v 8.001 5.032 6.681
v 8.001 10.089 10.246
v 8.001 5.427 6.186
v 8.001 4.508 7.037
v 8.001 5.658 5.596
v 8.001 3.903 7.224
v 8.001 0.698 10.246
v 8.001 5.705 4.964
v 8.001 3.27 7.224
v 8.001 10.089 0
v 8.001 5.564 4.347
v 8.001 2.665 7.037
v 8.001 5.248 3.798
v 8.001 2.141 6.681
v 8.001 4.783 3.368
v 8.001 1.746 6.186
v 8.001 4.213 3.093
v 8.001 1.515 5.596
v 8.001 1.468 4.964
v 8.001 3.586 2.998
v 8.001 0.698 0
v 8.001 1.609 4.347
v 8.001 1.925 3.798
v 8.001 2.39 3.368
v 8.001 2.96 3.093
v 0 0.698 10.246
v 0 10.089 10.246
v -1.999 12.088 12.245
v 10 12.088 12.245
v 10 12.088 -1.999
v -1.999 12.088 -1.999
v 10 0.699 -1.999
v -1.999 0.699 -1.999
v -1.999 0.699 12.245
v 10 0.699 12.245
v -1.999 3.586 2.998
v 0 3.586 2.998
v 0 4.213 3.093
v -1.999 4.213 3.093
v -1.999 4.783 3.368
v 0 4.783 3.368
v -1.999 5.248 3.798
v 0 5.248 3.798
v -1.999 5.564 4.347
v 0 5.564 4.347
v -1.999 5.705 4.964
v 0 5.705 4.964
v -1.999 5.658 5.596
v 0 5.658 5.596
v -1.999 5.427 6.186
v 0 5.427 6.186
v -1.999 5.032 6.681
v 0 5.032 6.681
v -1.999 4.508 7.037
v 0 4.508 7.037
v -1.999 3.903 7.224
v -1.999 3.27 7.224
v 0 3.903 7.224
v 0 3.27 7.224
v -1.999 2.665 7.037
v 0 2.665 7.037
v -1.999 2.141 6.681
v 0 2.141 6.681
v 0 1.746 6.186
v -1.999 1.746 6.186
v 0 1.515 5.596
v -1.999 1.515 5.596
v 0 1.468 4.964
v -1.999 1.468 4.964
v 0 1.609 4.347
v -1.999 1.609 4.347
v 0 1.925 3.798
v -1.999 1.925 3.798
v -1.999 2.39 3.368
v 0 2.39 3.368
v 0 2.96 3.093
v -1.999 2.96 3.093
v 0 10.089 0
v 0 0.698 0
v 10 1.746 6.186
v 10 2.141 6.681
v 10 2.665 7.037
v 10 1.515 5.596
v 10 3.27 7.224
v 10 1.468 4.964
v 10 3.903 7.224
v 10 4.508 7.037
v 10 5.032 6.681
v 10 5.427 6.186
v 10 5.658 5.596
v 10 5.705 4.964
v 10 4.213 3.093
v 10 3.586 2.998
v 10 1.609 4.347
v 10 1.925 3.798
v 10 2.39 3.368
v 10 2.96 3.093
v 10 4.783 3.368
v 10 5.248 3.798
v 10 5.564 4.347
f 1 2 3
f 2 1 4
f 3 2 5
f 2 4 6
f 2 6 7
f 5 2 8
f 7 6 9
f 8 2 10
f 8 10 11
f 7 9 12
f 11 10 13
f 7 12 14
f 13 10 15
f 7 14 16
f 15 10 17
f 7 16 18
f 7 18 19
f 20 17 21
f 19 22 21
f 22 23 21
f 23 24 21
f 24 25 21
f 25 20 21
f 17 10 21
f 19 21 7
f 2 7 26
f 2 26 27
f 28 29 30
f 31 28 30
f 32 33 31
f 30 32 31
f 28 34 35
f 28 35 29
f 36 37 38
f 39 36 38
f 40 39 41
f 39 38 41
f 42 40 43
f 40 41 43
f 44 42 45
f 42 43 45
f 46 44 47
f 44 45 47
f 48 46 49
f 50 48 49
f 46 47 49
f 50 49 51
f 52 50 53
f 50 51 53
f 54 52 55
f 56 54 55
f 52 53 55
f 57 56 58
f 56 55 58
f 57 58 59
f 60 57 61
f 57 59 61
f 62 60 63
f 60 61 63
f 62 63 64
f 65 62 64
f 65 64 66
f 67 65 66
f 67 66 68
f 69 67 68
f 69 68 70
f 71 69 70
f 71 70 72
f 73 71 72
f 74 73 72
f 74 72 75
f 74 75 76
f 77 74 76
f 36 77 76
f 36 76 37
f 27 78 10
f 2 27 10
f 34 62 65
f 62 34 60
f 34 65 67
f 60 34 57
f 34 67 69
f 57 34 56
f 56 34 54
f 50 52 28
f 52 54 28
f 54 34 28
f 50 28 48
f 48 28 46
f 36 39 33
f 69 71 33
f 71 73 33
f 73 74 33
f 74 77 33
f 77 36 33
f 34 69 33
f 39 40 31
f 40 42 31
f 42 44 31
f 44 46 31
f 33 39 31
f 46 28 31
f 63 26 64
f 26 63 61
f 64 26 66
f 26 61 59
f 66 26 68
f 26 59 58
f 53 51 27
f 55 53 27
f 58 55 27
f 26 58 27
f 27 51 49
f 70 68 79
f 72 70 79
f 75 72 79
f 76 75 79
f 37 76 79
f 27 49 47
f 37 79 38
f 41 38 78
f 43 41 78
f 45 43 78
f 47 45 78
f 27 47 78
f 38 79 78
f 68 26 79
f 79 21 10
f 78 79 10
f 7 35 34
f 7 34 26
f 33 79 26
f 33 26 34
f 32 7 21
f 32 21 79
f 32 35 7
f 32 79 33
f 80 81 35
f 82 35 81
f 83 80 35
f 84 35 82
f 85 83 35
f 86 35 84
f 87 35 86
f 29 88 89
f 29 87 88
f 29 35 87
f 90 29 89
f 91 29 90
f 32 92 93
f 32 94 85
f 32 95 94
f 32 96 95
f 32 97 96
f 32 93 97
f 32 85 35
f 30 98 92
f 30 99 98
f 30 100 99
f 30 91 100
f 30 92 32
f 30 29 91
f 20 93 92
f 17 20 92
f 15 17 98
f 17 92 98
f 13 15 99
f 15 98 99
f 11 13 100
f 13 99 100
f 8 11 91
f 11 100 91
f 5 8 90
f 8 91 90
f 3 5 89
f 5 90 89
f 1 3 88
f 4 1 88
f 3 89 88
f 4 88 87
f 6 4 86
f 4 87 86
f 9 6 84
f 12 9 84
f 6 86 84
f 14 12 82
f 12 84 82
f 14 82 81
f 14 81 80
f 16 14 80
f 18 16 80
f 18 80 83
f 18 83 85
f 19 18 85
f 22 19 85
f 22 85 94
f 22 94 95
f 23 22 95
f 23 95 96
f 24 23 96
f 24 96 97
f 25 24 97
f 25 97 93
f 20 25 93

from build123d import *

# Parameters (mm, degrees)
BOSS_EXTRUDE1_DEPTH = 10.24636
SKETCH2_R           = 2.12471
CUT_EXTRUDE1_DEPTH  = 12.99896
SKETCH3_W           = 10.24636
SKETCH3_H           = 0.6985
CUT_EXTRUDE2_DEPTH  = 12.99896
SKETCH4_W           = 1.99898
SKETCH4_H           = 11.38936
BOSS_EXTRUDE2_DEPTH = 11.99896


with BuildPart() as part:
    # Sketch1 → Boss-Extrude1 (new body)
    with BuildSketch(Plane.XY):
        Polygon((0, 0), (0, 10.08888), (8.001, 10.08888), (8.001, 0), (9.99998, 0), (9.99998, 12.08786), (-1.99898, 12.08786), (-1.99898, 0), align=None)
    extrude(amount=BOSS_EXTRUDE1_DEPTH)

    # Sketch2 → Cut-Extrude1 (cut, through all)
    with BuildSketch(Plane(origin=(9.99998, 0, 0), x_dir=(0, 0, -1), z_dir=(1, 0, 0))):
        with Locations((-5.12318, 3.58648)):
            Circle(SKETCH2_R)
    extrude(amount=-CUT_EXTRUDE1_DEPTH, mode=Mode.SUBTRACT)

    # Sketch3 → Cut-Extrude2 (cut, through all)
    with BuildSketch(Plane(origin=(9.99998, 0, 0), x_dir=(0, 0, -1), z_dir=(1, 0, 0))):
        with Locations((-5.12318, 0.34925)):
            Rectangle(SKETCH3_W, SKETCH3_H)
    extrude(amount=-CUT_EXTRUDE2_DEPTH, mode=Mode.SUBTRACT)

    # Sketch4 → Boss-Extrude2 (add)
    with BuildSketch(Plane(origin=(9.99998, 0, 0), x_dir=(0, 0, -1), z_dir=(1, 0, 0))):
        with Locations((-11.24585, 6.39318)):
            Rectangle(SKETCH4_W, SKETCH4_H)
        with Locations((0.99949, 6.39318)):
            Rectangle(SKETCH4_W, SKETCH4_H)
    extrude(amount=-BOSS_EXTRUDE2_DEPTH)


solid = part.part
